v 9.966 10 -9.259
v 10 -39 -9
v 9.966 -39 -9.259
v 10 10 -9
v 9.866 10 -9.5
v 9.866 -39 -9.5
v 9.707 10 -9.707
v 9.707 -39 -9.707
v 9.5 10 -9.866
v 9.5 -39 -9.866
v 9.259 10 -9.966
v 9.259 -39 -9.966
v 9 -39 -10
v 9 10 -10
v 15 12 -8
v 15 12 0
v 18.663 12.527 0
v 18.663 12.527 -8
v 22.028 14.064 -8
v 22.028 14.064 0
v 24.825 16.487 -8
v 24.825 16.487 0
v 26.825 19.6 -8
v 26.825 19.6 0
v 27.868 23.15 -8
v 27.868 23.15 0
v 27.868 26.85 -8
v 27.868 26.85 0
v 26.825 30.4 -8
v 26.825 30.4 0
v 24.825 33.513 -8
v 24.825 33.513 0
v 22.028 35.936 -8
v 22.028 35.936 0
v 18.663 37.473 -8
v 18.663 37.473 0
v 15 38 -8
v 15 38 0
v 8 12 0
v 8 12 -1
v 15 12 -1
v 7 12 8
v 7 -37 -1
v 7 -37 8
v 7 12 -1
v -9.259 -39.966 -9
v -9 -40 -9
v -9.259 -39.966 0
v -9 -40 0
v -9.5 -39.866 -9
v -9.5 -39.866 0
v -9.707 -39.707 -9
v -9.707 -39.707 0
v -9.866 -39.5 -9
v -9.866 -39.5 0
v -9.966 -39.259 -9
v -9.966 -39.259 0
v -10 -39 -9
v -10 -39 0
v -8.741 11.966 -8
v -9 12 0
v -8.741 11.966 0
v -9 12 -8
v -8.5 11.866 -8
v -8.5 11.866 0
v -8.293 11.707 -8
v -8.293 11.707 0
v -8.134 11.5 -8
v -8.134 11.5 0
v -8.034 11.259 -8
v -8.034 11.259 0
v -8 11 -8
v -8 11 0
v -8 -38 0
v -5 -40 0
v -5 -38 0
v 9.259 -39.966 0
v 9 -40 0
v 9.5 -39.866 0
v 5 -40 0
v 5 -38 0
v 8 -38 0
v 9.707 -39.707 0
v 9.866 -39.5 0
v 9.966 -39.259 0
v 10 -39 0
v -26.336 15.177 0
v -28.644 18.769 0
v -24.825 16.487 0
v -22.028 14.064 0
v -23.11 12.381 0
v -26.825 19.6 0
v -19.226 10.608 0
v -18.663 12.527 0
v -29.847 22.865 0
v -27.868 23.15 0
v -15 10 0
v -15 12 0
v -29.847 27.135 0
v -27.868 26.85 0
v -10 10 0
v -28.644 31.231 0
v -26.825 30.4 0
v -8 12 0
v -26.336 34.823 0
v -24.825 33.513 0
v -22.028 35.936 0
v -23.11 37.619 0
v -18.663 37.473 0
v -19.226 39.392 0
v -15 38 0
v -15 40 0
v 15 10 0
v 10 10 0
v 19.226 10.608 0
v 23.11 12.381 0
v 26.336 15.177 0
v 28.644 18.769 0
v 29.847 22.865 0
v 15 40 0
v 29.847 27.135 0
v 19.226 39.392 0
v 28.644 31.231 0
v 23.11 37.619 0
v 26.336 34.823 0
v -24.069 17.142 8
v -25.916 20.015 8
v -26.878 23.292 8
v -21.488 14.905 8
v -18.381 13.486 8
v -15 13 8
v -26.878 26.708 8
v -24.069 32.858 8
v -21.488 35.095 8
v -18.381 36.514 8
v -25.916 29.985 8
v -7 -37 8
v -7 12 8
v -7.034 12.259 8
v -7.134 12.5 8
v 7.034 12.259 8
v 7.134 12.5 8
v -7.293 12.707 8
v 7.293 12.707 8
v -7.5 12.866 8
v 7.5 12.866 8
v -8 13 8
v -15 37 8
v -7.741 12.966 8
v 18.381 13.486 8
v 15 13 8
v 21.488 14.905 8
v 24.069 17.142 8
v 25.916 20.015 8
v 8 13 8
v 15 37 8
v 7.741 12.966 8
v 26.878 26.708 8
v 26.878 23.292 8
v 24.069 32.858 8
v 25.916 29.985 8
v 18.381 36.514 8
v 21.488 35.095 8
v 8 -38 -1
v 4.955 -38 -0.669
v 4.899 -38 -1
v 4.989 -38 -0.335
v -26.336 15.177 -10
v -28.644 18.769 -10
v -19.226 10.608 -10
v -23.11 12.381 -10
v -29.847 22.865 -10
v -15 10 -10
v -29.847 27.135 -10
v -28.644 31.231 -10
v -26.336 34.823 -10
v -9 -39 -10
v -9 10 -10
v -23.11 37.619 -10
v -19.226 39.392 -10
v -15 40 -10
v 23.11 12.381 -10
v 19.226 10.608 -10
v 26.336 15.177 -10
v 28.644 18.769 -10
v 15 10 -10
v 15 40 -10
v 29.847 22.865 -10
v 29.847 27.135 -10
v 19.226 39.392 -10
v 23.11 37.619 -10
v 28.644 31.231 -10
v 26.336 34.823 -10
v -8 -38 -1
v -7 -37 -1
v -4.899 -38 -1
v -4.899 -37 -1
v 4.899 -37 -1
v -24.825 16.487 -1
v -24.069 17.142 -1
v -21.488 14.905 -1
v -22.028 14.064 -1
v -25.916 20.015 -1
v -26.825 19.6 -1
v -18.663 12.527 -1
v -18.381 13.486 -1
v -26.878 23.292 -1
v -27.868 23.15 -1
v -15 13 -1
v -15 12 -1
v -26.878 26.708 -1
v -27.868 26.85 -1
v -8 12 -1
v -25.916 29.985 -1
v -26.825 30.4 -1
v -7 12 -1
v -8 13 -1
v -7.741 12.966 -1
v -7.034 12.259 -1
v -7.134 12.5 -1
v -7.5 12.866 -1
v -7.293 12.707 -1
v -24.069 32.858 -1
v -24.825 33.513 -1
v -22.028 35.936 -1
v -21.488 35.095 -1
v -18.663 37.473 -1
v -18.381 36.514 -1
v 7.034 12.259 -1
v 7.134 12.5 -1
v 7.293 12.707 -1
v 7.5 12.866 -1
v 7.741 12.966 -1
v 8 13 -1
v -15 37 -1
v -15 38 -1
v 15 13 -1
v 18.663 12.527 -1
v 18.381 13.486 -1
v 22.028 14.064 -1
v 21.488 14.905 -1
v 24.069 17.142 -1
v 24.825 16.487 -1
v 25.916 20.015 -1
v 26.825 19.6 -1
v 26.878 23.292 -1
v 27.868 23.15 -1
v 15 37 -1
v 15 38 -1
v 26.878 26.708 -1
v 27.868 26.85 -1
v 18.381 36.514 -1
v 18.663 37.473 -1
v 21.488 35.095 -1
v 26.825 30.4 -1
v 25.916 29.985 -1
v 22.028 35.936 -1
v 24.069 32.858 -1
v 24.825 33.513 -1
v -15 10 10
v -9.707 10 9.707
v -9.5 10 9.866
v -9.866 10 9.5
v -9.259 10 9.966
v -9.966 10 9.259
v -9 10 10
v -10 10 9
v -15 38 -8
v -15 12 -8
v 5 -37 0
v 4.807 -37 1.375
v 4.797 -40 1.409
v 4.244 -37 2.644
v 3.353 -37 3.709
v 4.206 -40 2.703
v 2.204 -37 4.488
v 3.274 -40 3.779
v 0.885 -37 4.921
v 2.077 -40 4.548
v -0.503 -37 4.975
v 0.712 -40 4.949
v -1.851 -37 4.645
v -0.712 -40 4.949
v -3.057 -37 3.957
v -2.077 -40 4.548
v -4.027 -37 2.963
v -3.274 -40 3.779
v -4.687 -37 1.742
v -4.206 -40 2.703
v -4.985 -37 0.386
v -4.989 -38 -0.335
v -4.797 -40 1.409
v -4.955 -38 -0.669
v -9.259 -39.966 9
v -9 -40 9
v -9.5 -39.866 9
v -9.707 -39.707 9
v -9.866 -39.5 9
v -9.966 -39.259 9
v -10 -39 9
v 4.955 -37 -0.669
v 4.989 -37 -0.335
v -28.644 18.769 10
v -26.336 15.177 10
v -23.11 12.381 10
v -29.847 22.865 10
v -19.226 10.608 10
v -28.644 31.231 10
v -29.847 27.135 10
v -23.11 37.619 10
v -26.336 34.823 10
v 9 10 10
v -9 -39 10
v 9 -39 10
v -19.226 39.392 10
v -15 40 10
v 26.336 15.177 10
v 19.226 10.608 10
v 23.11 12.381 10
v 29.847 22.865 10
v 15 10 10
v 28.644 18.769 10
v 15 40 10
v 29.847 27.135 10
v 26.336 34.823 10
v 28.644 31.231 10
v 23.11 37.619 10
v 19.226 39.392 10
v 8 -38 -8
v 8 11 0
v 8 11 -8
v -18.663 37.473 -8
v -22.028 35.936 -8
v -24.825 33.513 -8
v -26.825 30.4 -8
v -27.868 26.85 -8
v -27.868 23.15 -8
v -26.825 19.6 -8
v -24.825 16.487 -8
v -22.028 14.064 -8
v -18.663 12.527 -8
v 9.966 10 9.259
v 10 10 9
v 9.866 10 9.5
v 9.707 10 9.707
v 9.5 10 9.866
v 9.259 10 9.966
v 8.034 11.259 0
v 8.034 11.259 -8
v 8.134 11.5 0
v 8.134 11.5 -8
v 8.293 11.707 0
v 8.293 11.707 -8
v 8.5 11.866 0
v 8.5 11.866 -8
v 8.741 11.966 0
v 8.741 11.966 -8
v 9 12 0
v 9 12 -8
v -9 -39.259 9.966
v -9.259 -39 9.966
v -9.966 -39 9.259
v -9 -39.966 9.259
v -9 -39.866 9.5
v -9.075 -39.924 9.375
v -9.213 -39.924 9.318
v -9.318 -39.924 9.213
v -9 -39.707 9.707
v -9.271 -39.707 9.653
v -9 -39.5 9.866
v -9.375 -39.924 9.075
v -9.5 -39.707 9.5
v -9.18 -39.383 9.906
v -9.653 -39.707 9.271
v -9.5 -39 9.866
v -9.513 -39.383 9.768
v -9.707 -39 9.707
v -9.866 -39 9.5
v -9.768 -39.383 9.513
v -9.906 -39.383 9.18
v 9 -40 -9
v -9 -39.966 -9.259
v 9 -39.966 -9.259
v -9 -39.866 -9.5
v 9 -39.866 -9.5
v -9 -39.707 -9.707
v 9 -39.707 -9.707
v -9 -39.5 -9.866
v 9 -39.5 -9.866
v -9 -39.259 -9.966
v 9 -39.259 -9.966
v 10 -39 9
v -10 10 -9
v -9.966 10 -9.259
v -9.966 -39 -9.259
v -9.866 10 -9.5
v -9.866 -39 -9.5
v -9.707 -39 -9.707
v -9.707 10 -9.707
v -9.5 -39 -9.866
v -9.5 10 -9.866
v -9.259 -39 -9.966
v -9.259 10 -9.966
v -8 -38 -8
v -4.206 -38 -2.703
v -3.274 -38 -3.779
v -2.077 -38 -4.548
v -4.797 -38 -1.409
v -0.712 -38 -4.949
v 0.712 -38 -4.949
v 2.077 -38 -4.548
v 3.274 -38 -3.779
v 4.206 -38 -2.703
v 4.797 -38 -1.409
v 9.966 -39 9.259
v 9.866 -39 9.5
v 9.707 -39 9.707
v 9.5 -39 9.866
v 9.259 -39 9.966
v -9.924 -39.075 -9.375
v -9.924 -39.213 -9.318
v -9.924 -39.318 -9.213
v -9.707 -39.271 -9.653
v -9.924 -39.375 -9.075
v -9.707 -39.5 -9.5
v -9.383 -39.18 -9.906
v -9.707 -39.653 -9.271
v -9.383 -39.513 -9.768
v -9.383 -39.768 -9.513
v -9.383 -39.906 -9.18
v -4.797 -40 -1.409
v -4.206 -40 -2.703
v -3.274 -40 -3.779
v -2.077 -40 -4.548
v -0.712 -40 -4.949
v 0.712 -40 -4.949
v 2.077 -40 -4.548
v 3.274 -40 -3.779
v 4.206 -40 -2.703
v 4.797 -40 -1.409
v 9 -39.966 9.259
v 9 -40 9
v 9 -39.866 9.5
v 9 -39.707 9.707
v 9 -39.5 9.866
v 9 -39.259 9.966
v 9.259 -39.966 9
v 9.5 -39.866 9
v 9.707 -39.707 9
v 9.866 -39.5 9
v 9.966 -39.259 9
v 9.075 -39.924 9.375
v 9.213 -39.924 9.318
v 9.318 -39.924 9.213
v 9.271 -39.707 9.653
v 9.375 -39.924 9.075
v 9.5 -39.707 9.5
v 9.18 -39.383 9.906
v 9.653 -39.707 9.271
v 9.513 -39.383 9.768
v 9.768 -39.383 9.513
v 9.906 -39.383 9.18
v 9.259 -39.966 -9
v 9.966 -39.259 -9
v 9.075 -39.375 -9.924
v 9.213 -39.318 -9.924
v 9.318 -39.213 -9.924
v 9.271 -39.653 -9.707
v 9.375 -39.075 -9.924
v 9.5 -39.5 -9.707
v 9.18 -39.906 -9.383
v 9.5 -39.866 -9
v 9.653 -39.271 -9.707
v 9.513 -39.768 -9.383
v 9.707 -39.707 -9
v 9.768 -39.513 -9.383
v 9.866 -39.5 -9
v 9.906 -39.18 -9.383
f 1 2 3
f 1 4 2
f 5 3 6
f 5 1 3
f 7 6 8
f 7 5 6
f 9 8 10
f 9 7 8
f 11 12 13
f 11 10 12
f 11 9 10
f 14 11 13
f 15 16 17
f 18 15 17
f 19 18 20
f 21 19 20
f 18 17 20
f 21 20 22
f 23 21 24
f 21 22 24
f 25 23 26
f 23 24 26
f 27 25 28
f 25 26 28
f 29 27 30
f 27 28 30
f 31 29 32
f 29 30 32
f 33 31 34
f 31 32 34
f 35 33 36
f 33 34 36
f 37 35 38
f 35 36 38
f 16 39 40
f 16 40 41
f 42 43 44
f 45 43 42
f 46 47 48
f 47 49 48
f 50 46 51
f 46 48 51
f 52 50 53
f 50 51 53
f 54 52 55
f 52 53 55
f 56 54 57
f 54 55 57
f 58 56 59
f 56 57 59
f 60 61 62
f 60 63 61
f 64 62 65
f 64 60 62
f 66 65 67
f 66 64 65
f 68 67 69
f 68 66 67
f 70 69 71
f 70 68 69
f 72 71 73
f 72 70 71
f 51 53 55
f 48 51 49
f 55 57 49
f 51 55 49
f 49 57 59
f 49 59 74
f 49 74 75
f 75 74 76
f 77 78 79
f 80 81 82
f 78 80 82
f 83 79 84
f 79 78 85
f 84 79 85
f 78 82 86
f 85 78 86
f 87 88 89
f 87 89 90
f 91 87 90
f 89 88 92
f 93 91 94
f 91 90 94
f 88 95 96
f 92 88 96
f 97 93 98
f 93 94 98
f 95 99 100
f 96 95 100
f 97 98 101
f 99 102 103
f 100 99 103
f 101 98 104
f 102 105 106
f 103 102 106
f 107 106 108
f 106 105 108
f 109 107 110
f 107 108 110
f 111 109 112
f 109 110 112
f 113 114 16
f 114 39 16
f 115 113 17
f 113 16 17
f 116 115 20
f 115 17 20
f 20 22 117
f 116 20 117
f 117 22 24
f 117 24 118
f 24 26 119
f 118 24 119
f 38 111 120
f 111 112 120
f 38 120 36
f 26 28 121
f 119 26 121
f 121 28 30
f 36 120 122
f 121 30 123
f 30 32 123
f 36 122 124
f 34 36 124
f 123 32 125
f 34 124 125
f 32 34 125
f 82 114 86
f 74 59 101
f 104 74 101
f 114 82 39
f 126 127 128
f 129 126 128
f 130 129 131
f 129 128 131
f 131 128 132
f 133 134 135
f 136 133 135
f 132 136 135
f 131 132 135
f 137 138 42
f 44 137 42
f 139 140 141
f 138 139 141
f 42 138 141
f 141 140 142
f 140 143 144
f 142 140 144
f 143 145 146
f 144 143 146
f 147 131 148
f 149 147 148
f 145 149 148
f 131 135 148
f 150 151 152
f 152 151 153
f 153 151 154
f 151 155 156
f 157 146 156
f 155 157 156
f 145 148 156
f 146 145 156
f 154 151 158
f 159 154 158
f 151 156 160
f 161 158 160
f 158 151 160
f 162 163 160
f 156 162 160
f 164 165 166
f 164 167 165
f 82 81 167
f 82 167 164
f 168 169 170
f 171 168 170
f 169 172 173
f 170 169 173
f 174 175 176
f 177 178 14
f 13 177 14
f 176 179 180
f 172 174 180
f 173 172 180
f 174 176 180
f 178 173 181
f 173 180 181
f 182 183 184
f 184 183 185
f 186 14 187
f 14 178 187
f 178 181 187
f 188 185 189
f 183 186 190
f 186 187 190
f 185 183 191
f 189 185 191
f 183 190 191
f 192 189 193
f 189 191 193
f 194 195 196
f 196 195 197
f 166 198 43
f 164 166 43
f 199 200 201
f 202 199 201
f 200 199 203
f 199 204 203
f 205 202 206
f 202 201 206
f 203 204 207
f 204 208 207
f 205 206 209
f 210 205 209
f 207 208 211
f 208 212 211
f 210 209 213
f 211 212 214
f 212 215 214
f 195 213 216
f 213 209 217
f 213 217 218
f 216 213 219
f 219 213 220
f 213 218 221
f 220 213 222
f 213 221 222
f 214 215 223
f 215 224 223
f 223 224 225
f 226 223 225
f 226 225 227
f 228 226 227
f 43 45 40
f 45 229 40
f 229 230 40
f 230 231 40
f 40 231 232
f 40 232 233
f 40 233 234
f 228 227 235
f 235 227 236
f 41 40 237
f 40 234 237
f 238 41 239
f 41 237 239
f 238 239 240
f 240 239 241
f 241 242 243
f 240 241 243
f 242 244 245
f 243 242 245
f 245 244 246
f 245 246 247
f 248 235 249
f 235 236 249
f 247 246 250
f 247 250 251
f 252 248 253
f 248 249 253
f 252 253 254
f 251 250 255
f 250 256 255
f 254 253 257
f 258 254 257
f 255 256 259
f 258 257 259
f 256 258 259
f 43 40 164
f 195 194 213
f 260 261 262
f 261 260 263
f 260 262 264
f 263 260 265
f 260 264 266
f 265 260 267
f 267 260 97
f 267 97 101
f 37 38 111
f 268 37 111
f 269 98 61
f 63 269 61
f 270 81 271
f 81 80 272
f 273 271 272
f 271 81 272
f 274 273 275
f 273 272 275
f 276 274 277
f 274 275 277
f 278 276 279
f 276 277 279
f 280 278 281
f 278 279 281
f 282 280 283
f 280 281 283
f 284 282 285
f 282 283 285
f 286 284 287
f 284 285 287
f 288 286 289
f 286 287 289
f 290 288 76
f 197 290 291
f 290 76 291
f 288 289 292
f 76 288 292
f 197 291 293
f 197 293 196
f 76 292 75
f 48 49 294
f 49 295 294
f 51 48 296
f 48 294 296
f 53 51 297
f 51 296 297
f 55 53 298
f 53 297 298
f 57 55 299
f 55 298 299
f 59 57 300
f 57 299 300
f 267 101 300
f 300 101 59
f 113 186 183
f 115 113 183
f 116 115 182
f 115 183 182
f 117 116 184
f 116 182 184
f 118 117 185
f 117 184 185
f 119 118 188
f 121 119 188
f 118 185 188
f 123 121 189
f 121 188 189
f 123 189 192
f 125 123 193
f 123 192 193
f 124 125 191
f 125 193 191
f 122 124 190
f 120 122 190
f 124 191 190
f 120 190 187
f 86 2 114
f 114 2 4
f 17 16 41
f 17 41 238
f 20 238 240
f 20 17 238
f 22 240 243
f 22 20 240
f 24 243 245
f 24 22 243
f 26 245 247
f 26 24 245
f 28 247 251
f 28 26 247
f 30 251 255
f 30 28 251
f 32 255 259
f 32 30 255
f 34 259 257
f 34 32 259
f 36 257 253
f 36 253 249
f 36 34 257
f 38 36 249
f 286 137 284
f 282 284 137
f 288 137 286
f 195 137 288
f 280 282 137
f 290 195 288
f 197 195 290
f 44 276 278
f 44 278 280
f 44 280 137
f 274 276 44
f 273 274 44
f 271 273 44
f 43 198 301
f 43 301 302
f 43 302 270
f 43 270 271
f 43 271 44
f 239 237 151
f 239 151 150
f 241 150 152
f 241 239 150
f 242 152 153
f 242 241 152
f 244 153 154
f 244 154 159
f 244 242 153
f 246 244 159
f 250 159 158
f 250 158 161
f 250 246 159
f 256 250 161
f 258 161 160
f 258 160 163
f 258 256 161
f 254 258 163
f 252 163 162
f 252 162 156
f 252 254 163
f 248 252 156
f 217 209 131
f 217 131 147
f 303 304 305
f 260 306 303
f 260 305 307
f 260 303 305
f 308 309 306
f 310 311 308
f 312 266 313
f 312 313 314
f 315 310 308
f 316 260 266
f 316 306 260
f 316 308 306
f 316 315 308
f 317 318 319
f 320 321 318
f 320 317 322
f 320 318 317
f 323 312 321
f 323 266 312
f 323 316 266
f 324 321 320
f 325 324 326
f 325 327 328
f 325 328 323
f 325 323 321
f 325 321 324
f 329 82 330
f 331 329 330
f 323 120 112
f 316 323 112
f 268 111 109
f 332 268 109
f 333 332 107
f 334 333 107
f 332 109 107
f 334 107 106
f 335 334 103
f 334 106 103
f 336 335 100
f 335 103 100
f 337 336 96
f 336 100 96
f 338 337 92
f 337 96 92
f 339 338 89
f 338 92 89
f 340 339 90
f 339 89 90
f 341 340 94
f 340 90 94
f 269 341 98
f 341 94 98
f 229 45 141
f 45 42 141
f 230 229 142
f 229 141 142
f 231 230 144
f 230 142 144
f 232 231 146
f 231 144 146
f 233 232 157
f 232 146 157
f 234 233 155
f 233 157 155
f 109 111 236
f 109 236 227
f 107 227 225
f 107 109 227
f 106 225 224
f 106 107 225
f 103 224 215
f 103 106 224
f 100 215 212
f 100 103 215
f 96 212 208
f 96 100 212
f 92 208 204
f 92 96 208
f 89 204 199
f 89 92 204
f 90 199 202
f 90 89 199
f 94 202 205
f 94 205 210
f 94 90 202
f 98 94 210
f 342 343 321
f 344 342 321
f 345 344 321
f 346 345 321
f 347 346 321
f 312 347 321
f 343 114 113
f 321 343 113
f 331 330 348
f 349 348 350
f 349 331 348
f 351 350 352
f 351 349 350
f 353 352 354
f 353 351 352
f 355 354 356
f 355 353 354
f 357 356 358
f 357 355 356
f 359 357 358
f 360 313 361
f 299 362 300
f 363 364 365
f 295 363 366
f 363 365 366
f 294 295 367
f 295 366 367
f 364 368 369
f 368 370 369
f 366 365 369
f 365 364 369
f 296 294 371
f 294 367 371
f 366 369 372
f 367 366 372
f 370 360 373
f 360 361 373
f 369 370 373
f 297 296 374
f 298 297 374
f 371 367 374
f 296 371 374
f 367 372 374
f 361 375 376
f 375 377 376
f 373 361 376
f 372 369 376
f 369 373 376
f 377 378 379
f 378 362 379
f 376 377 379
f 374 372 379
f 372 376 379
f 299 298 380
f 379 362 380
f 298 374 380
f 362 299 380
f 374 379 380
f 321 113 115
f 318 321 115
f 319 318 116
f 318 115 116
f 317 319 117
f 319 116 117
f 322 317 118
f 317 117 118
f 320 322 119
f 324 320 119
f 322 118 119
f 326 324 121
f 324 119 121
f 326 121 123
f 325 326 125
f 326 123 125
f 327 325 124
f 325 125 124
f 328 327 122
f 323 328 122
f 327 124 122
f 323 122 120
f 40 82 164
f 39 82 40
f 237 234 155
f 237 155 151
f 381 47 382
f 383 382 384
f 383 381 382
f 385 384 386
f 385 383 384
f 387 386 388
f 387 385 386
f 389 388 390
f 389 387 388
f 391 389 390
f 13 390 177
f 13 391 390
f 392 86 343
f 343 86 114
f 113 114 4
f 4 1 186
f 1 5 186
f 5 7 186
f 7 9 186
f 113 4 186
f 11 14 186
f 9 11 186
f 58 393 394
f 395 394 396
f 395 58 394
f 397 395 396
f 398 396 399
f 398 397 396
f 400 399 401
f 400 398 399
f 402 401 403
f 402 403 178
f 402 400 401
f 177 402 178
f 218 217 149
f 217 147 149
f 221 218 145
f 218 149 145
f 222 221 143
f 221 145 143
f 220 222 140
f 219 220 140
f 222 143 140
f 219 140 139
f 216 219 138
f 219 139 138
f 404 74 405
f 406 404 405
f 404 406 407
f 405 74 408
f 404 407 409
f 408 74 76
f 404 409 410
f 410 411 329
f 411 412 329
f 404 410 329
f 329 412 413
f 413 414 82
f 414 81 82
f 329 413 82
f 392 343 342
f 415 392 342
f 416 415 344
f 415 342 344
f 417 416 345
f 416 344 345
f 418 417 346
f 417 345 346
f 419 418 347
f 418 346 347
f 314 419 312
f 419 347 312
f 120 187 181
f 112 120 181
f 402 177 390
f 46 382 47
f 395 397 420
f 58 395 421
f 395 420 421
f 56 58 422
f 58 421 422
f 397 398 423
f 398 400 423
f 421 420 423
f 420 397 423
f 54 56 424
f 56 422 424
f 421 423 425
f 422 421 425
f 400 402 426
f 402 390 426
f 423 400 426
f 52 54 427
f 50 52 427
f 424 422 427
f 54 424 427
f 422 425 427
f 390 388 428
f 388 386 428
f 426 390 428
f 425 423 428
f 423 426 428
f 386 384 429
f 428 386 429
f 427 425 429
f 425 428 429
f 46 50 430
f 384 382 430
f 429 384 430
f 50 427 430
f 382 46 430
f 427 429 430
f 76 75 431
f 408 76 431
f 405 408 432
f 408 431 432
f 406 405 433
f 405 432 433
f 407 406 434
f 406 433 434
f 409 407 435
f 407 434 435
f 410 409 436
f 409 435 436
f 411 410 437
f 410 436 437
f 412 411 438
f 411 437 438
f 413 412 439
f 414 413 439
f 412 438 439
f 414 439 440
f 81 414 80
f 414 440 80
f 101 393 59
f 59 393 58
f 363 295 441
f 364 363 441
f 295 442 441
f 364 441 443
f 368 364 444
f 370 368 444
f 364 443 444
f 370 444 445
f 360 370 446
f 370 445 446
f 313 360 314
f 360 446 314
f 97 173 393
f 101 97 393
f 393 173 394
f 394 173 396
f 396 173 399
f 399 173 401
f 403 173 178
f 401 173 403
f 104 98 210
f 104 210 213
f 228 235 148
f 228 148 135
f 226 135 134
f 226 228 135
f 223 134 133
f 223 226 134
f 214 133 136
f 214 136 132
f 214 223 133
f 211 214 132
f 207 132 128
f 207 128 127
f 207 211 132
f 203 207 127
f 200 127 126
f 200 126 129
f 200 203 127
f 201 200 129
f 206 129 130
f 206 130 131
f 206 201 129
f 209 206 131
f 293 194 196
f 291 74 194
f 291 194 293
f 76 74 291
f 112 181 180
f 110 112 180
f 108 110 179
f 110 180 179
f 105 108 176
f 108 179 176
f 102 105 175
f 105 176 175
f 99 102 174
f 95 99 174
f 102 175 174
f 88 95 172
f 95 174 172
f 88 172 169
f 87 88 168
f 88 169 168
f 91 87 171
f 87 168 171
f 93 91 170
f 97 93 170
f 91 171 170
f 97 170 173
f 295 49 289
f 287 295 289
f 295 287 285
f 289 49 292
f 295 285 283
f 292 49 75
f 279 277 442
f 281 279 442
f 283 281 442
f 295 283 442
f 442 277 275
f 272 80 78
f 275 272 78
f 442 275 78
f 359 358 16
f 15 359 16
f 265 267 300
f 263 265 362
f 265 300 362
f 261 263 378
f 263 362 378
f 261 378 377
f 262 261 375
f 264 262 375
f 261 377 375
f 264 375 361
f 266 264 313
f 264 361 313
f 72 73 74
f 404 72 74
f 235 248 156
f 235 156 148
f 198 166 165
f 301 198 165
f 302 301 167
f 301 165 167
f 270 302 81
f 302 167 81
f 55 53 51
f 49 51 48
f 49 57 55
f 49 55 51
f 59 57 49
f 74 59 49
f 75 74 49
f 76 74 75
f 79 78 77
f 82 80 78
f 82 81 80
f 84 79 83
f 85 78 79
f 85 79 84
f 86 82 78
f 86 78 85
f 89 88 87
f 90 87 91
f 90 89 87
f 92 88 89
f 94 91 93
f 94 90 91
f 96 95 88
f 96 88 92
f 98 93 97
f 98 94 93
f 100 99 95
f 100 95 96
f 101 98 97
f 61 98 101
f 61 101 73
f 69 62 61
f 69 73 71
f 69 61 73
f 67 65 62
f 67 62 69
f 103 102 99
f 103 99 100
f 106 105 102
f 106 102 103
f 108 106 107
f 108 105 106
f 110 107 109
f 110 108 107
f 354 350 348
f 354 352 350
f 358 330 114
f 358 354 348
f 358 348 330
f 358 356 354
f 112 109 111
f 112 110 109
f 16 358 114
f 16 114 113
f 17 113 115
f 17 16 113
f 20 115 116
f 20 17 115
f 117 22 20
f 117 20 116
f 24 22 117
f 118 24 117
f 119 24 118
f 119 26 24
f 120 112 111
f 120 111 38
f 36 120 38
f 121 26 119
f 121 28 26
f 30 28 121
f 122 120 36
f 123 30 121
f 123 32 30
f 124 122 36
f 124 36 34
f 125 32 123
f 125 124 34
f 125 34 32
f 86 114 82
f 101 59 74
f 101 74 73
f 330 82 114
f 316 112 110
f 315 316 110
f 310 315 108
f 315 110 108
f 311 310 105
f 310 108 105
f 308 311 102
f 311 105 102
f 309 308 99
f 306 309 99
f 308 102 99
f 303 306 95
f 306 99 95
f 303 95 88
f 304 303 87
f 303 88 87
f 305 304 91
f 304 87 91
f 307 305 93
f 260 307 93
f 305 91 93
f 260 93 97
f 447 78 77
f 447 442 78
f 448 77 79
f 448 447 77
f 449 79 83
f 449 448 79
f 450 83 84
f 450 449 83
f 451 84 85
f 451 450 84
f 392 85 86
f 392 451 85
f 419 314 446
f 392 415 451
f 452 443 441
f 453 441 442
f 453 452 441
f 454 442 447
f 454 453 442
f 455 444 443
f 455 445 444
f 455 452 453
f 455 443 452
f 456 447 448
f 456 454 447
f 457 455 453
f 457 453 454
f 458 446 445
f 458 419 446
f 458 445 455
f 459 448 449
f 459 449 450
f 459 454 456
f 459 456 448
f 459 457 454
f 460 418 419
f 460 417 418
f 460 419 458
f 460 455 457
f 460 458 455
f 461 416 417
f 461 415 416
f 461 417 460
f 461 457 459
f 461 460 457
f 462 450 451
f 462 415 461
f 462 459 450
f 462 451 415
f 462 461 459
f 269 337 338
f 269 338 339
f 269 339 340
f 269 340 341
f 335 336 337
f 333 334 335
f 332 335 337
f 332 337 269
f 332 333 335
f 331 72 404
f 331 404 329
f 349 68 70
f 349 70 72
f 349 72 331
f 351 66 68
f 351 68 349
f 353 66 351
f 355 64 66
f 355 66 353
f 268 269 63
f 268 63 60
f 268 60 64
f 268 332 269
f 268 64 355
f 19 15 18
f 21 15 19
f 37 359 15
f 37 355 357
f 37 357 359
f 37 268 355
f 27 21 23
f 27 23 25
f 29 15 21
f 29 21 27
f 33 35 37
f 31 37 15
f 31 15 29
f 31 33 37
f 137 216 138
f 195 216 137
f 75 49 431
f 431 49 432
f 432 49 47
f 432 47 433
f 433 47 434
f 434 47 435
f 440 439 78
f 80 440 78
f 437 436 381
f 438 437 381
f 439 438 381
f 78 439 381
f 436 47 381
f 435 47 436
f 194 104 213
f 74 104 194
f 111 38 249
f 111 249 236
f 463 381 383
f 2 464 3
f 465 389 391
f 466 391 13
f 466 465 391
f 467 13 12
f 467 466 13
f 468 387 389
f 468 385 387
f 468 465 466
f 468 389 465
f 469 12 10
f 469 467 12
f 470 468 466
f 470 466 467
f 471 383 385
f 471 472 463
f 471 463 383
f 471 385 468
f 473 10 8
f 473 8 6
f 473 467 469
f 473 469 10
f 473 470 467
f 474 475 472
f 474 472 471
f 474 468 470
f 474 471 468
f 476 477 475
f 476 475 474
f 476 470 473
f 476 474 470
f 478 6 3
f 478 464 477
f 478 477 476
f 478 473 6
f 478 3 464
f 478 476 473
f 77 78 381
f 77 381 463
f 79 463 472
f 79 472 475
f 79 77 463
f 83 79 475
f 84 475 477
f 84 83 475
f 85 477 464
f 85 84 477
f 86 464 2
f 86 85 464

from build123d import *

# Parameters (mm, degrees)
PAD_DEPTH       = 10
PAD002_DEPTH    = 11
POCKET_DEPTH    = 9
SKETCH004_R     = 5
POCKET002_DEPTH = 5
FILLET_R        = 1
FILLET001_R     = 1
PAD001_DEPTH    = 10
POCKET004_DEPTH = 8
POCKET001_DEPTH = 1
SKETCH005_R     = 5
POCKET003_DEPTH = 5
FILLET002_R     = 1
FILLET003_R     = 1


with BuildPart() as bottom:
    # Sketch → Pad (new body)
    with BuildSketch(Plane.XY):
        with BuildLine():
            Line((10, 10), (15, 10))
            ThreePointArc((15, 10), (30, 25), (15, 40))
            Line((15, 40), (-15, 40))
            ThreePointArc((-15, 40), (-30, 25), (-15, 10))
            Line((-15, 10), (-10, 10))
            Line((-10, 10), (-10, -40))
            Line((-10, -40), (10, -40))
            Line((10, -40), (10, 10))
        make_face()
    extrude(amount=PAD_DEPTH)

    # Sketch006 → Pad002 (join)
    with BuildSketch(Plane.XY.offset(10)):
        with BuildLine():
            Line((8, 12), (15, 12))
            ThreePointArc((15, 12), (28, 25), (15, 38))
            Line((15, 38), (-15, 38))
            ThreePointArc((-15, 38), (-28, 25), (-15, 12))
            Line((-15, 12), (-8, 12))
            Line((-8, 12), (-8, -38))
            Line((-8, -38), (8, -38))
            Line((8, -38), (8, 12))
        make_face()
    extrude(amount=-PAD002_DEPTH)

    # Sketch001 → Pocket (cut)
    with BuildSketch(Plane.XY.offset(-1)):
        with BuildLine():
            Line((7, 13), (15, 13))
            ThreePointArc((15, 13), (27, 25), (15, 37))
            Line((15, 37), (-15, 37))
            ThreePointArc((-15, 37), (-27, 25), (-15, 13))
            Line((-15, 13), (-7, 13))
            Line((-7, 13), (-7, -37))
            Line((-7, -37), (7, -37))
            Line((7, -37), (7, 13))
        make_face()
    extrude(amount=POCKET_DEPTH, mode=Mode.SUBTRACT)

    # Sketch004 → Pocket002 (cut)
    with BuildSketch(Plane.XZ.offset(40)):
        Circle(SKETCH004_R)
    extrude(amount=-POCKET002_DEPTH, mode=Mode.SUBTRACT)

    # Fillet
    fillet_edges = [bottom.edges().sort_by_distance(p)[0] for p in [
        (-7, 13, 3.5),
        (7, 13, 3.5),
    ]]
    fillet(fillet_edges, radius=FILLET_R)

    # Fillet001
    fillet001_edges = [bottom.edges().sort_by_distance(p)[0] for p in [
        (10, -15, 10),
        (-10, -15, 10),
        (0, -40, 10),
        (10, -40, 5),
        (-10, -40, 5),
    ]]
    fillet(fillet001_edges, radius=FILLET001_R)


with BuildPart() as top:
    # Sketch003 → Pad001 (new body)
    with BuildSketch(Plane.XY.offset(-10)):
        with BuildLine():
            Line((10, 10), (15, 10))
            ThreePointArc((15, 10), (30, 25), (15, 40))
            Line((15, 40), (-15, 40))
            ThreePointArc((-15, 40), (-30, 25), (-15, 10))
            Line((-15, 10), (-10, 10))
            Line((-10, 10), (-10, -40))
            Line((-10, -40), (10, -40))
            Line((10, -40), (10, 10))
        make_face()
    extrude(amount=PAD001_DEPTH)

    # Sketch007 → Pocket004 (cut)
    with BuildSketch(Plane.XY):
        with BuildLine():
            Line((8, 12), (15, 12))
            ThreePointArc((15, 12), (28, 25), (15, 38))
            Line((15, 38), (-15, 38))
            ThreePointArc((-15, 38), (-28, 25), (-15, 12))
            Line((-15, 12), (-8, 12))
            Line((-8, 12), (-8, -38))
            Line((-8, -38), (8, -38))
            Line((8, -38), (8, 12))
        make_face()
    extrude(amount=-POCKET004_DEPTH, mode=Mode.SUBTRACT)

    # Sketch002 → Pocket001 (cut)
    with BuildSketch(Plane.XY):
        with BuildLine():
            Line((7, 13), (15, 13))
            ThreePointArc((15, 13), (27, 25), (15, 37))
            Line((15, 37), (-15, 37))
            ThreePointArc((-15, 37), (-27, 25), (-15, 13))
            Line((-15, 13), (-7, 13))
            Line((-7, 13), (-7, -37))
            Line((-7, -37), (7, -37))
            Line((7, -37), (7, 13))
        make_face()
    extrude(amount=-POCKET001_DEPTH, mode=Mode.SUBTRACT)

    # Sketch005 → Pocket003 (cut)
    with BuildSketch(Plane.XZ.offset(40)):
        Circle(SKETCH005_R)
    extrude(amount=-POCKET003_DEPTH, mode=Mode.SUBTRACT)

    # Fillet002
    fillet002_edges = [top.edges().sort_by_distance(p)[0] for p in [
        (-8, 12, -4),
        (8, 12, -4),
    ]]
    fillet(fillet002_edges, radius=FILLET002_R)

    # Fillet003
    fillet003_edges = [top.edges().sort_by_distance(p)[0] for p in [
        (10, -40, -5),
        (0, -40, -10),
        (-10, -15, -10),
        (-10, -40, -5),
        (10, -15, -10),
    ]]
    fillet(fillet003_edges, radius=FILLET003_R)


solid = Compound([bottom.part, top.part])
